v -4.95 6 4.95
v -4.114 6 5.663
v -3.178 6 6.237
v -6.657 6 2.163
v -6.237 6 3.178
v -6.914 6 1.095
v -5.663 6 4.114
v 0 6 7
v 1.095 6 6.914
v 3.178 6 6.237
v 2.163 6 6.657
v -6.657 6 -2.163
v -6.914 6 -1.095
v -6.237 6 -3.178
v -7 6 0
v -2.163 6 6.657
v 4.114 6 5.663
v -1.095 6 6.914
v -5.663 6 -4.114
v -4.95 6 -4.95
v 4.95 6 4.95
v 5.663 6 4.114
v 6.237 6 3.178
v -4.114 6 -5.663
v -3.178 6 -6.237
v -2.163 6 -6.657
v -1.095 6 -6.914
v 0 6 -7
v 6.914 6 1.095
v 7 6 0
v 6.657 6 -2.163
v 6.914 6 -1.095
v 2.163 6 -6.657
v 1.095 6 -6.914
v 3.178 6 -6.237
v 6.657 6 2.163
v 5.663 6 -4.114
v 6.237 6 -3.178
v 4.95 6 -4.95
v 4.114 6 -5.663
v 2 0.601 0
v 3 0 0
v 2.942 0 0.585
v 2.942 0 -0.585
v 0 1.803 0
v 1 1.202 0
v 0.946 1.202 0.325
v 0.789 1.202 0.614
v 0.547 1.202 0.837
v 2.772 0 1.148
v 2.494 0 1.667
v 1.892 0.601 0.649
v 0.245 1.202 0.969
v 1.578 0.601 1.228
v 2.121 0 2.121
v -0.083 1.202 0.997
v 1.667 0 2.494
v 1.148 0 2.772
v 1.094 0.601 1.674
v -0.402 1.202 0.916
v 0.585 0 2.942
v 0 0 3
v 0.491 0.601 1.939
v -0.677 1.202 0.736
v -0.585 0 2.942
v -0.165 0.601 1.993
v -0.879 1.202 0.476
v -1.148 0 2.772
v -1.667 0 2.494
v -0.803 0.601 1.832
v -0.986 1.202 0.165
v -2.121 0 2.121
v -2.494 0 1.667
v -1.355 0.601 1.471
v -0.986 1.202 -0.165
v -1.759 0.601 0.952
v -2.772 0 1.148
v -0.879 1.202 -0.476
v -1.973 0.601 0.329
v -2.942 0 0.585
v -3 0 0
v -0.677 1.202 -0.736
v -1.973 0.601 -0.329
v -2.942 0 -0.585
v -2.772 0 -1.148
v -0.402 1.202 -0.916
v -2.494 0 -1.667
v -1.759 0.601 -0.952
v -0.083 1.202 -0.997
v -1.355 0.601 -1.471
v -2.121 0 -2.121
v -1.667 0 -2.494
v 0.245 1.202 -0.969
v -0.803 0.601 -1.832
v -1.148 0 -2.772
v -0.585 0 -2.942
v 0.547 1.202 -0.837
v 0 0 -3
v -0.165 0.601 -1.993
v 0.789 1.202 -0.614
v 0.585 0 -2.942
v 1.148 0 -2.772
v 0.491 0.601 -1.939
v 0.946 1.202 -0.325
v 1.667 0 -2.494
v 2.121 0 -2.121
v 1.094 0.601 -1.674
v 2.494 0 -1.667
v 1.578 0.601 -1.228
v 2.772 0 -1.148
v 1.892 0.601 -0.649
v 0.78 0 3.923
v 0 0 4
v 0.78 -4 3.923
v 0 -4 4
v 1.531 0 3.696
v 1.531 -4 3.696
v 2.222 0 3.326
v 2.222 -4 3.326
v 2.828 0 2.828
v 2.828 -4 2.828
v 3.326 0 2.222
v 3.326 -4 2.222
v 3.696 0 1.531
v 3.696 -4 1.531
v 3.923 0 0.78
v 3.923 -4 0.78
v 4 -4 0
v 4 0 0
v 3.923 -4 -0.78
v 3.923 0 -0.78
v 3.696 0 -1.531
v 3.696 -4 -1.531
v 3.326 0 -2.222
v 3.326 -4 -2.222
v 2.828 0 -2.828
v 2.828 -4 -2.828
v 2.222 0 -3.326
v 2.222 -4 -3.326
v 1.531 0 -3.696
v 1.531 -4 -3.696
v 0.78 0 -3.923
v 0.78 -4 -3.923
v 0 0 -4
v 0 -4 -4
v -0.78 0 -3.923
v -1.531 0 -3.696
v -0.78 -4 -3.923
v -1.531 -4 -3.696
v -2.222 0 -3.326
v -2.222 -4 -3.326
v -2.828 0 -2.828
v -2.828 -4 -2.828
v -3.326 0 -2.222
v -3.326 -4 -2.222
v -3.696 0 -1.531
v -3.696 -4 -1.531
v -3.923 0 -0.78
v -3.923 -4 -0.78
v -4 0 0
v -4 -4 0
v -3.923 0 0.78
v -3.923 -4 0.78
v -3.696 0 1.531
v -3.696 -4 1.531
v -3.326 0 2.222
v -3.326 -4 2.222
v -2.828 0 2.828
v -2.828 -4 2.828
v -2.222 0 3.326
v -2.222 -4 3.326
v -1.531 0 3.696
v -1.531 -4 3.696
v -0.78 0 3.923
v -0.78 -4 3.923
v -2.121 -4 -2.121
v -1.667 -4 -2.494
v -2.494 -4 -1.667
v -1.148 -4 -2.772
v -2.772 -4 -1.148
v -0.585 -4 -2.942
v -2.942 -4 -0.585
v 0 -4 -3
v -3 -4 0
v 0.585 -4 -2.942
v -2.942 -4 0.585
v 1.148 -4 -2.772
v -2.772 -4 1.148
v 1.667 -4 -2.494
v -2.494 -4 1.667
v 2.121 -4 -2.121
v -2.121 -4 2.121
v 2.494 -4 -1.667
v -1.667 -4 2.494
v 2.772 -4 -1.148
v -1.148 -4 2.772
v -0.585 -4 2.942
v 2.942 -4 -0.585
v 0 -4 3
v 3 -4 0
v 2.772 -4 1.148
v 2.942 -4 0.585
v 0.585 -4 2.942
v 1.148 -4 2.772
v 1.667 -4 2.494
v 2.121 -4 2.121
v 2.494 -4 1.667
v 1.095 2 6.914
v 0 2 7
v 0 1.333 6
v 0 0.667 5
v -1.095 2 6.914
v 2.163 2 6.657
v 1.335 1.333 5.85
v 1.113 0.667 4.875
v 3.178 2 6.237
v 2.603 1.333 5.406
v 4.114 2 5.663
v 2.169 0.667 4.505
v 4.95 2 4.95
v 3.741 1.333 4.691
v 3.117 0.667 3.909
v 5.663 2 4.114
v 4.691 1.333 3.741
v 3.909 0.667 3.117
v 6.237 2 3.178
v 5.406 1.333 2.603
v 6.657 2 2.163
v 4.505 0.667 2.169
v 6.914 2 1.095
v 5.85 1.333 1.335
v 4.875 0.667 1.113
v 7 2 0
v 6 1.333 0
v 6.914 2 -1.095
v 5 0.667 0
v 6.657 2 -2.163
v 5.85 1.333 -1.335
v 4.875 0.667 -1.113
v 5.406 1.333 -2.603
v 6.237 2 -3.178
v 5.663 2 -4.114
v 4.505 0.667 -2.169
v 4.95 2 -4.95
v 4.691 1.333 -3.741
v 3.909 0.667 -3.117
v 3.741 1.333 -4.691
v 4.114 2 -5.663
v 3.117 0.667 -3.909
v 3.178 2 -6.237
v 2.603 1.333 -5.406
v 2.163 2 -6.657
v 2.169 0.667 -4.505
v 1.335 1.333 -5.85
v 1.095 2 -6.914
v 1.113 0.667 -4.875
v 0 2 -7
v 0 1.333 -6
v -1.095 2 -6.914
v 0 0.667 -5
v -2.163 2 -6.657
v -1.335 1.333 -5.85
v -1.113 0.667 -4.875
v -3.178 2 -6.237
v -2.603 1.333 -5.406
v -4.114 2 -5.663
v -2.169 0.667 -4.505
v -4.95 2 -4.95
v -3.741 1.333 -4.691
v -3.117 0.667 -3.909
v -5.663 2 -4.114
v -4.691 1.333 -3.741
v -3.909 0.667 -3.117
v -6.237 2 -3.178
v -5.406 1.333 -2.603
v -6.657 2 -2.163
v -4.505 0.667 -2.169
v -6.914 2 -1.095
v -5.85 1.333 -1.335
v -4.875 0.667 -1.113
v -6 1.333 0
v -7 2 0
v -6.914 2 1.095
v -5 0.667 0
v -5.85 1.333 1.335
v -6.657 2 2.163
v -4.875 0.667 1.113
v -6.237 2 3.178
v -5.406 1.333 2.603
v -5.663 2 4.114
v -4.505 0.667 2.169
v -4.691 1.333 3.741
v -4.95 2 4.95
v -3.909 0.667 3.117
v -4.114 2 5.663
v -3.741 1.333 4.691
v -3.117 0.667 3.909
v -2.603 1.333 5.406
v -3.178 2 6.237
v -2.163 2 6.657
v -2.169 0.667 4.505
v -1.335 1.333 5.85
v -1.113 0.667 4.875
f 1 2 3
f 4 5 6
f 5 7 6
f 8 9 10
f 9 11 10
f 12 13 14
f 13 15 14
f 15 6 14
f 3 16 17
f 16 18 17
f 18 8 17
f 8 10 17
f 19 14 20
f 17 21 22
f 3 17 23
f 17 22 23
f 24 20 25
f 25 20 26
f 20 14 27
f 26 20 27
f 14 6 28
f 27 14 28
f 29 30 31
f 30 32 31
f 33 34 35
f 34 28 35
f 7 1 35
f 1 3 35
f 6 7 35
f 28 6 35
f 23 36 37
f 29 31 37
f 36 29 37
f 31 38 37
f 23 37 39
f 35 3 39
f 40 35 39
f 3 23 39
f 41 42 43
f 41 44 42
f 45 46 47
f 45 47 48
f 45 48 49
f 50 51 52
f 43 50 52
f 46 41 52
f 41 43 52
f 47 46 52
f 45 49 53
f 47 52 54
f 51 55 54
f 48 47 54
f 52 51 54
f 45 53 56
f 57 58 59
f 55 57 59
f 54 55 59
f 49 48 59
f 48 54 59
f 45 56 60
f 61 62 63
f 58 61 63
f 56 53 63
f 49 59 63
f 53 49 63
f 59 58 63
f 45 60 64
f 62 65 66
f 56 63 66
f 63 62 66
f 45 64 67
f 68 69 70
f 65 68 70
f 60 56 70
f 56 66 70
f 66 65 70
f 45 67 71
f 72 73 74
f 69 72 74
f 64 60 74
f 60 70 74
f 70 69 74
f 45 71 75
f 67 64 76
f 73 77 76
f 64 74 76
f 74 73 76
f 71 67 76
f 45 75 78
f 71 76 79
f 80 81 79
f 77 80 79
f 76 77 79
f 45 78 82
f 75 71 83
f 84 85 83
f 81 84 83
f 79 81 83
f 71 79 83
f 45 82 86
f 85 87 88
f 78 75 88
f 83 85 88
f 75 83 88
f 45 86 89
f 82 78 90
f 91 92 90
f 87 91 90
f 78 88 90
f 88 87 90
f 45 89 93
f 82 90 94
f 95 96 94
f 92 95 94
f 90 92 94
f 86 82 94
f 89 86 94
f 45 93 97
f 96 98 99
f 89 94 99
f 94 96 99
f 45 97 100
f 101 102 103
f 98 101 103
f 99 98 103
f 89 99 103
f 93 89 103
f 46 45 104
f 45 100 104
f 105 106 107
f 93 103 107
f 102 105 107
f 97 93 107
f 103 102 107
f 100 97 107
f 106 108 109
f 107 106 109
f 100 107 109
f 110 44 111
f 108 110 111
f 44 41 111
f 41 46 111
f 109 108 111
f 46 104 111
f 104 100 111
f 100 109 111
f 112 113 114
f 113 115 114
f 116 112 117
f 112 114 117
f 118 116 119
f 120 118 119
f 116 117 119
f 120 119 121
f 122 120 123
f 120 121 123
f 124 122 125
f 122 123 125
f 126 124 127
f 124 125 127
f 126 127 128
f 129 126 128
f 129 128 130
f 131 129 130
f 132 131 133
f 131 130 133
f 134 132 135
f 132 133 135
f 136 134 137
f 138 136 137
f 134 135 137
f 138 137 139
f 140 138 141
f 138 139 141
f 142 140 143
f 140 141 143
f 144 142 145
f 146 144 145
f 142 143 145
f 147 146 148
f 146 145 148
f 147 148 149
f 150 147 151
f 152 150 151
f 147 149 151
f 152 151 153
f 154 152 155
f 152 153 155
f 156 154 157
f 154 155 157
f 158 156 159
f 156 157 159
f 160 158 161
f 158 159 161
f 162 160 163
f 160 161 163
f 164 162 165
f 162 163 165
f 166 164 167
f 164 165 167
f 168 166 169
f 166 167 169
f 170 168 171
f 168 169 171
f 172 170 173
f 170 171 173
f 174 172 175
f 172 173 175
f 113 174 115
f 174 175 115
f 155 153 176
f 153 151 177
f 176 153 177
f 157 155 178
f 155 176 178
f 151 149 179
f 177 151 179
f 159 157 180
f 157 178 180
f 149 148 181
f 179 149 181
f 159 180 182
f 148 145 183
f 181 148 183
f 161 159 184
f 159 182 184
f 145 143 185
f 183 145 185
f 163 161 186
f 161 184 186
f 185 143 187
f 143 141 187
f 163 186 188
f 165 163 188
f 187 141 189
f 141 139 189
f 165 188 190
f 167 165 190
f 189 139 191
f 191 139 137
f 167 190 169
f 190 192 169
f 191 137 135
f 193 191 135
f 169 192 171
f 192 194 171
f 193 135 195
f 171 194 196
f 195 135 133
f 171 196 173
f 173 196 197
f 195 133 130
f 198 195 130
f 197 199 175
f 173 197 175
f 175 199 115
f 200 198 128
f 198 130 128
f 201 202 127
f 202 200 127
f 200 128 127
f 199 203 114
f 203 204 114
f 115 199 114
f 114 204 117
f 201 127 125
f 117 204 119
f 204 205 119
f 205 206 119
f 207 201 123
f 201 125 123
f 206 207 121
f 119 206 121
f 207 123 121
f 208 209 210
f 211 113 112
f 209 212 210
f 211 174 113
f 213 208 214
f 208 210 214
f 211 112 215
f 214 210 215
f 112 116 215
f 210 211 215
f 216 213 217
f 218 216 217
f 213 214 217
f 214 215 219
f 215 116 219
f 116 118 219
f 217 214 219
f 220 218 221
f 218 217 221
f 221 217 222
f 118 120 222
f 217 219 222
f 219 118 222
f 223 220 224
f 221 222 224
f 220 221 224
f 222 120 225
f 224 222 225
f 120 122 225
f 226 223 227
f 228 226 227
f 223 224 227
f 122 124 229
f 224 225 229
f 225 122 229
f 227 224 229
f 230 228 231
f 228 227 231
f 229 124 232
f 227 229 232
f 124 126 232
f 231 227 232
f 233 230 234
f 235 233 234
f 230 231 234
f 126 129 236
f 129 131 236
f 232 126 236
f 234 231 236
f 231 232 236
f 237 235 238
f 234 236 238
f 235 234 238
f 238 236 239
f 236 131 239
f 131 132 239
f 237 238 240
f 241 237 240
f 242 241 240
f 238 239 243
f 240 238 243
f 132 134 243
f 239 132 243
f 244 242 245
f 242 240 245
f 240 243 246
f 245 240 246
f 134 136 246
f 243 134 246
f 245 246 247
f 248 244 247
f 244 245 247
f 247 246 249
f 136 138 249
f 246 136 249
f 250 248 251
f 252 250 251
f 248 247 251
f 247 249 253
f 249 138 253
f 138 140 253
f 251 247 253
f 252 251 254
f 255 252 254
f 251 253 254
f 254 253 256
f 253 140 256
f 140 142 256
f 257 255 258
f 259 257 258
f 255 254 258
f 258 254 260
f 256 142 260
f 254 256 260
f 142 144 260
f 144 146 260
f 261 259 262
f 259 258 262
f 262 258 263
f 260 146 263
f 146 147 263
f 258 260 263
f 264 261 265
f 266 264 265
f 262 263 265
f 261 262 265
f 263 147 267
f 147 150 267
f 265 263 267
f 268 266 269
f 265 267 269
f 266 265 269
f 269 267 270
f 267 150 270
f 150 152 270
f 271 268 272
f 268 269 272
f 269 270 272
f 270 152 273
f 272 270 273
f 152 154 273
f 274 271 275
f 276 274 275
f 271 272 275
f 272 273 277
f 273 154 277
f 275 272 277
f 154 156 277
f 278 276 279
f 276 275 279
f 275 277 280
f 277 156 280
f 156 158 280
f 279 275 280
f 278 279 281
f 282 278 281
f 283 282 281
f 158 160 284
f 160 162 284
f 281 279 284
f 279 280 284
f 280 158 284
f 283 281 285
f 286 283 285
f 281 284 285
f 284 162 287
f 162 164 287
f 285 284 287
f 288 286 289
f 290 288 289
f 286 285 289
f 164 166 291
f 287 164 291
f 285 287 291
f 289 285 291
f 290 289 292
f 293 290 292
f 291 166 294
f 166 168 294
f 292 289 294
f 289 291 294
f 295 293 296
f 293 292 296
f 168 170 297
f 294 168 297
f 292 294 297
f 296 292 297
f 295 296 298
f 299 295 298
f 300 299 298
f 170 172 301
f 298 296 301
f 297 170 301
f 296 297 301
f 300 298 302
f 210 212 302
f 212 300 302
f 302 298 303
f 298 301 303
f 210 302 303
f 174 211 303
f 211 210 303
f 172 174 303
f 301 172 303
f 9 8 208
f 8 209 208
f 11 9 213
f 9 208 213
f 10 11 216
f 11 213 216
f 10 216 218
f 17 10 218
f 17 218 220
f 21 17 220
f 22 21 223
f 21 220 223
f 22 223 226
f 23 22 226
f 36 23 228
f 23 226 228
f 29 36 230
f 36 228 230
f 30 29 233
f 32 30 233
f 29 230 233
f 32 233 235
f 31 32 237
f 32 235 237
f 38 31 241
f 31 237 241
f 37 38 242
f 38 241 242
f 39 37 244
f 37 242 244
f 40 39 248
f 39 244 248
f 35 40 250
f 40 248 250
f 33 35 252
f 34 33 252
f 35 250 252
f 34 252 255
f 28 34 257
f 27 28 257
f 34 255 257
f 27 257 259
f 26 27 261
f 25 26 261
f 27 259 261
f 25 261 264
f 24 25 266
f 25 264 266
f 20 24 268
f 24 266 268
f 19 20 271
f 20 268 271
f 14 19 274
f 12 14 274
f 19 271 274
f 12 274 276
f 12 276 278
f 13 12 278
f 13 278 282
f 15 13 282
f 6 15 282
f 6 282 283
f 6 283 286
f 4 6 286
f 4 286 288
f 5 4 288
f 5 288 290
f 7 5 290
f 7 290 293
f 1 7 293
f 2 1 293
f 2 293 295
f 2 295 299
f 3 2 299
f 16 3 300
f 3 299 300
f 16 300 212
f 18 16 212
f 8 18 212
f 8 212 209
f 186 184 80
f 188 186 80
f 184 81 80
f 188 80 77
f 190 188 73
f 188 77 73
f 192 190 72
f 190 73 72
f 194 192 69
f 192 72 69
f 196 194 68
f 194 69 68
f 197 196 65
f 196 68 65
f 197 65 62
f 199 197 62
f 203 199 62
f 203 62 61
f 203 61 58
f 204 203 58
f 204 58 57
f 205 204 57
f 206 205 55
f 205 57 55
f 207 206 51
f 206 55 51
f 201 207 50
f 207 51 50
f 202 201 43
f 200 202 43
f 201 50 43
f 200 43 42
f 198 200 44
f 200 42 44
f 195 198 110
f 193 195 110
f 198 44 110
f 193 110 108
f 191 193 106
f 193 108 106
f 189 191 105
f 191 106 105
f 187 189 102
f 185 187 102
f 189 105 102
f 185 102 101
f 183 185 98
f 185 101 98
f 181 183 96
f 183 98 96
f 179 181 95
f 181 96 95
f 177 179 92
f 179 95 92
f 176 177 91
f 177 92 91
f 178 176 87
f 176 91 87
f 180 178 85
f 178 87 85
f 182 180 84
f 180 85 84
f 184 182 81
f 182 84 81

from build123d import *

# Parameters (mm, degrees)
F3_D     = 6
F3_DEPTH = 4
F3_TIP   = 1.8025818571


with BuildPart() as f1:
    # F0 (on Right) → F1 (revolve)
    with BuildSketch(Plane.YZ):
        Polygon((-4, 4), (-4, 0), (6, 0), (6, 7), (2, 7), (0, 4), align=None)
    revolve(axis=Axis((0, 1, 0), (0, 1, 0)))

    # F3
    with Locations(Plane.XZ.offset(4)):
        with Locations((0, 0)):
            Hole(F3_D / 2, depth=F3_DEPTH)
            with Locations((0, 0, -(F3_DEPTH + F3_TIP / 2))):  # 118° drill point
                Cone(0, F3_D / 2, F3_TIP, mode=Mode.SUBTRACT)


solid = f1.part
